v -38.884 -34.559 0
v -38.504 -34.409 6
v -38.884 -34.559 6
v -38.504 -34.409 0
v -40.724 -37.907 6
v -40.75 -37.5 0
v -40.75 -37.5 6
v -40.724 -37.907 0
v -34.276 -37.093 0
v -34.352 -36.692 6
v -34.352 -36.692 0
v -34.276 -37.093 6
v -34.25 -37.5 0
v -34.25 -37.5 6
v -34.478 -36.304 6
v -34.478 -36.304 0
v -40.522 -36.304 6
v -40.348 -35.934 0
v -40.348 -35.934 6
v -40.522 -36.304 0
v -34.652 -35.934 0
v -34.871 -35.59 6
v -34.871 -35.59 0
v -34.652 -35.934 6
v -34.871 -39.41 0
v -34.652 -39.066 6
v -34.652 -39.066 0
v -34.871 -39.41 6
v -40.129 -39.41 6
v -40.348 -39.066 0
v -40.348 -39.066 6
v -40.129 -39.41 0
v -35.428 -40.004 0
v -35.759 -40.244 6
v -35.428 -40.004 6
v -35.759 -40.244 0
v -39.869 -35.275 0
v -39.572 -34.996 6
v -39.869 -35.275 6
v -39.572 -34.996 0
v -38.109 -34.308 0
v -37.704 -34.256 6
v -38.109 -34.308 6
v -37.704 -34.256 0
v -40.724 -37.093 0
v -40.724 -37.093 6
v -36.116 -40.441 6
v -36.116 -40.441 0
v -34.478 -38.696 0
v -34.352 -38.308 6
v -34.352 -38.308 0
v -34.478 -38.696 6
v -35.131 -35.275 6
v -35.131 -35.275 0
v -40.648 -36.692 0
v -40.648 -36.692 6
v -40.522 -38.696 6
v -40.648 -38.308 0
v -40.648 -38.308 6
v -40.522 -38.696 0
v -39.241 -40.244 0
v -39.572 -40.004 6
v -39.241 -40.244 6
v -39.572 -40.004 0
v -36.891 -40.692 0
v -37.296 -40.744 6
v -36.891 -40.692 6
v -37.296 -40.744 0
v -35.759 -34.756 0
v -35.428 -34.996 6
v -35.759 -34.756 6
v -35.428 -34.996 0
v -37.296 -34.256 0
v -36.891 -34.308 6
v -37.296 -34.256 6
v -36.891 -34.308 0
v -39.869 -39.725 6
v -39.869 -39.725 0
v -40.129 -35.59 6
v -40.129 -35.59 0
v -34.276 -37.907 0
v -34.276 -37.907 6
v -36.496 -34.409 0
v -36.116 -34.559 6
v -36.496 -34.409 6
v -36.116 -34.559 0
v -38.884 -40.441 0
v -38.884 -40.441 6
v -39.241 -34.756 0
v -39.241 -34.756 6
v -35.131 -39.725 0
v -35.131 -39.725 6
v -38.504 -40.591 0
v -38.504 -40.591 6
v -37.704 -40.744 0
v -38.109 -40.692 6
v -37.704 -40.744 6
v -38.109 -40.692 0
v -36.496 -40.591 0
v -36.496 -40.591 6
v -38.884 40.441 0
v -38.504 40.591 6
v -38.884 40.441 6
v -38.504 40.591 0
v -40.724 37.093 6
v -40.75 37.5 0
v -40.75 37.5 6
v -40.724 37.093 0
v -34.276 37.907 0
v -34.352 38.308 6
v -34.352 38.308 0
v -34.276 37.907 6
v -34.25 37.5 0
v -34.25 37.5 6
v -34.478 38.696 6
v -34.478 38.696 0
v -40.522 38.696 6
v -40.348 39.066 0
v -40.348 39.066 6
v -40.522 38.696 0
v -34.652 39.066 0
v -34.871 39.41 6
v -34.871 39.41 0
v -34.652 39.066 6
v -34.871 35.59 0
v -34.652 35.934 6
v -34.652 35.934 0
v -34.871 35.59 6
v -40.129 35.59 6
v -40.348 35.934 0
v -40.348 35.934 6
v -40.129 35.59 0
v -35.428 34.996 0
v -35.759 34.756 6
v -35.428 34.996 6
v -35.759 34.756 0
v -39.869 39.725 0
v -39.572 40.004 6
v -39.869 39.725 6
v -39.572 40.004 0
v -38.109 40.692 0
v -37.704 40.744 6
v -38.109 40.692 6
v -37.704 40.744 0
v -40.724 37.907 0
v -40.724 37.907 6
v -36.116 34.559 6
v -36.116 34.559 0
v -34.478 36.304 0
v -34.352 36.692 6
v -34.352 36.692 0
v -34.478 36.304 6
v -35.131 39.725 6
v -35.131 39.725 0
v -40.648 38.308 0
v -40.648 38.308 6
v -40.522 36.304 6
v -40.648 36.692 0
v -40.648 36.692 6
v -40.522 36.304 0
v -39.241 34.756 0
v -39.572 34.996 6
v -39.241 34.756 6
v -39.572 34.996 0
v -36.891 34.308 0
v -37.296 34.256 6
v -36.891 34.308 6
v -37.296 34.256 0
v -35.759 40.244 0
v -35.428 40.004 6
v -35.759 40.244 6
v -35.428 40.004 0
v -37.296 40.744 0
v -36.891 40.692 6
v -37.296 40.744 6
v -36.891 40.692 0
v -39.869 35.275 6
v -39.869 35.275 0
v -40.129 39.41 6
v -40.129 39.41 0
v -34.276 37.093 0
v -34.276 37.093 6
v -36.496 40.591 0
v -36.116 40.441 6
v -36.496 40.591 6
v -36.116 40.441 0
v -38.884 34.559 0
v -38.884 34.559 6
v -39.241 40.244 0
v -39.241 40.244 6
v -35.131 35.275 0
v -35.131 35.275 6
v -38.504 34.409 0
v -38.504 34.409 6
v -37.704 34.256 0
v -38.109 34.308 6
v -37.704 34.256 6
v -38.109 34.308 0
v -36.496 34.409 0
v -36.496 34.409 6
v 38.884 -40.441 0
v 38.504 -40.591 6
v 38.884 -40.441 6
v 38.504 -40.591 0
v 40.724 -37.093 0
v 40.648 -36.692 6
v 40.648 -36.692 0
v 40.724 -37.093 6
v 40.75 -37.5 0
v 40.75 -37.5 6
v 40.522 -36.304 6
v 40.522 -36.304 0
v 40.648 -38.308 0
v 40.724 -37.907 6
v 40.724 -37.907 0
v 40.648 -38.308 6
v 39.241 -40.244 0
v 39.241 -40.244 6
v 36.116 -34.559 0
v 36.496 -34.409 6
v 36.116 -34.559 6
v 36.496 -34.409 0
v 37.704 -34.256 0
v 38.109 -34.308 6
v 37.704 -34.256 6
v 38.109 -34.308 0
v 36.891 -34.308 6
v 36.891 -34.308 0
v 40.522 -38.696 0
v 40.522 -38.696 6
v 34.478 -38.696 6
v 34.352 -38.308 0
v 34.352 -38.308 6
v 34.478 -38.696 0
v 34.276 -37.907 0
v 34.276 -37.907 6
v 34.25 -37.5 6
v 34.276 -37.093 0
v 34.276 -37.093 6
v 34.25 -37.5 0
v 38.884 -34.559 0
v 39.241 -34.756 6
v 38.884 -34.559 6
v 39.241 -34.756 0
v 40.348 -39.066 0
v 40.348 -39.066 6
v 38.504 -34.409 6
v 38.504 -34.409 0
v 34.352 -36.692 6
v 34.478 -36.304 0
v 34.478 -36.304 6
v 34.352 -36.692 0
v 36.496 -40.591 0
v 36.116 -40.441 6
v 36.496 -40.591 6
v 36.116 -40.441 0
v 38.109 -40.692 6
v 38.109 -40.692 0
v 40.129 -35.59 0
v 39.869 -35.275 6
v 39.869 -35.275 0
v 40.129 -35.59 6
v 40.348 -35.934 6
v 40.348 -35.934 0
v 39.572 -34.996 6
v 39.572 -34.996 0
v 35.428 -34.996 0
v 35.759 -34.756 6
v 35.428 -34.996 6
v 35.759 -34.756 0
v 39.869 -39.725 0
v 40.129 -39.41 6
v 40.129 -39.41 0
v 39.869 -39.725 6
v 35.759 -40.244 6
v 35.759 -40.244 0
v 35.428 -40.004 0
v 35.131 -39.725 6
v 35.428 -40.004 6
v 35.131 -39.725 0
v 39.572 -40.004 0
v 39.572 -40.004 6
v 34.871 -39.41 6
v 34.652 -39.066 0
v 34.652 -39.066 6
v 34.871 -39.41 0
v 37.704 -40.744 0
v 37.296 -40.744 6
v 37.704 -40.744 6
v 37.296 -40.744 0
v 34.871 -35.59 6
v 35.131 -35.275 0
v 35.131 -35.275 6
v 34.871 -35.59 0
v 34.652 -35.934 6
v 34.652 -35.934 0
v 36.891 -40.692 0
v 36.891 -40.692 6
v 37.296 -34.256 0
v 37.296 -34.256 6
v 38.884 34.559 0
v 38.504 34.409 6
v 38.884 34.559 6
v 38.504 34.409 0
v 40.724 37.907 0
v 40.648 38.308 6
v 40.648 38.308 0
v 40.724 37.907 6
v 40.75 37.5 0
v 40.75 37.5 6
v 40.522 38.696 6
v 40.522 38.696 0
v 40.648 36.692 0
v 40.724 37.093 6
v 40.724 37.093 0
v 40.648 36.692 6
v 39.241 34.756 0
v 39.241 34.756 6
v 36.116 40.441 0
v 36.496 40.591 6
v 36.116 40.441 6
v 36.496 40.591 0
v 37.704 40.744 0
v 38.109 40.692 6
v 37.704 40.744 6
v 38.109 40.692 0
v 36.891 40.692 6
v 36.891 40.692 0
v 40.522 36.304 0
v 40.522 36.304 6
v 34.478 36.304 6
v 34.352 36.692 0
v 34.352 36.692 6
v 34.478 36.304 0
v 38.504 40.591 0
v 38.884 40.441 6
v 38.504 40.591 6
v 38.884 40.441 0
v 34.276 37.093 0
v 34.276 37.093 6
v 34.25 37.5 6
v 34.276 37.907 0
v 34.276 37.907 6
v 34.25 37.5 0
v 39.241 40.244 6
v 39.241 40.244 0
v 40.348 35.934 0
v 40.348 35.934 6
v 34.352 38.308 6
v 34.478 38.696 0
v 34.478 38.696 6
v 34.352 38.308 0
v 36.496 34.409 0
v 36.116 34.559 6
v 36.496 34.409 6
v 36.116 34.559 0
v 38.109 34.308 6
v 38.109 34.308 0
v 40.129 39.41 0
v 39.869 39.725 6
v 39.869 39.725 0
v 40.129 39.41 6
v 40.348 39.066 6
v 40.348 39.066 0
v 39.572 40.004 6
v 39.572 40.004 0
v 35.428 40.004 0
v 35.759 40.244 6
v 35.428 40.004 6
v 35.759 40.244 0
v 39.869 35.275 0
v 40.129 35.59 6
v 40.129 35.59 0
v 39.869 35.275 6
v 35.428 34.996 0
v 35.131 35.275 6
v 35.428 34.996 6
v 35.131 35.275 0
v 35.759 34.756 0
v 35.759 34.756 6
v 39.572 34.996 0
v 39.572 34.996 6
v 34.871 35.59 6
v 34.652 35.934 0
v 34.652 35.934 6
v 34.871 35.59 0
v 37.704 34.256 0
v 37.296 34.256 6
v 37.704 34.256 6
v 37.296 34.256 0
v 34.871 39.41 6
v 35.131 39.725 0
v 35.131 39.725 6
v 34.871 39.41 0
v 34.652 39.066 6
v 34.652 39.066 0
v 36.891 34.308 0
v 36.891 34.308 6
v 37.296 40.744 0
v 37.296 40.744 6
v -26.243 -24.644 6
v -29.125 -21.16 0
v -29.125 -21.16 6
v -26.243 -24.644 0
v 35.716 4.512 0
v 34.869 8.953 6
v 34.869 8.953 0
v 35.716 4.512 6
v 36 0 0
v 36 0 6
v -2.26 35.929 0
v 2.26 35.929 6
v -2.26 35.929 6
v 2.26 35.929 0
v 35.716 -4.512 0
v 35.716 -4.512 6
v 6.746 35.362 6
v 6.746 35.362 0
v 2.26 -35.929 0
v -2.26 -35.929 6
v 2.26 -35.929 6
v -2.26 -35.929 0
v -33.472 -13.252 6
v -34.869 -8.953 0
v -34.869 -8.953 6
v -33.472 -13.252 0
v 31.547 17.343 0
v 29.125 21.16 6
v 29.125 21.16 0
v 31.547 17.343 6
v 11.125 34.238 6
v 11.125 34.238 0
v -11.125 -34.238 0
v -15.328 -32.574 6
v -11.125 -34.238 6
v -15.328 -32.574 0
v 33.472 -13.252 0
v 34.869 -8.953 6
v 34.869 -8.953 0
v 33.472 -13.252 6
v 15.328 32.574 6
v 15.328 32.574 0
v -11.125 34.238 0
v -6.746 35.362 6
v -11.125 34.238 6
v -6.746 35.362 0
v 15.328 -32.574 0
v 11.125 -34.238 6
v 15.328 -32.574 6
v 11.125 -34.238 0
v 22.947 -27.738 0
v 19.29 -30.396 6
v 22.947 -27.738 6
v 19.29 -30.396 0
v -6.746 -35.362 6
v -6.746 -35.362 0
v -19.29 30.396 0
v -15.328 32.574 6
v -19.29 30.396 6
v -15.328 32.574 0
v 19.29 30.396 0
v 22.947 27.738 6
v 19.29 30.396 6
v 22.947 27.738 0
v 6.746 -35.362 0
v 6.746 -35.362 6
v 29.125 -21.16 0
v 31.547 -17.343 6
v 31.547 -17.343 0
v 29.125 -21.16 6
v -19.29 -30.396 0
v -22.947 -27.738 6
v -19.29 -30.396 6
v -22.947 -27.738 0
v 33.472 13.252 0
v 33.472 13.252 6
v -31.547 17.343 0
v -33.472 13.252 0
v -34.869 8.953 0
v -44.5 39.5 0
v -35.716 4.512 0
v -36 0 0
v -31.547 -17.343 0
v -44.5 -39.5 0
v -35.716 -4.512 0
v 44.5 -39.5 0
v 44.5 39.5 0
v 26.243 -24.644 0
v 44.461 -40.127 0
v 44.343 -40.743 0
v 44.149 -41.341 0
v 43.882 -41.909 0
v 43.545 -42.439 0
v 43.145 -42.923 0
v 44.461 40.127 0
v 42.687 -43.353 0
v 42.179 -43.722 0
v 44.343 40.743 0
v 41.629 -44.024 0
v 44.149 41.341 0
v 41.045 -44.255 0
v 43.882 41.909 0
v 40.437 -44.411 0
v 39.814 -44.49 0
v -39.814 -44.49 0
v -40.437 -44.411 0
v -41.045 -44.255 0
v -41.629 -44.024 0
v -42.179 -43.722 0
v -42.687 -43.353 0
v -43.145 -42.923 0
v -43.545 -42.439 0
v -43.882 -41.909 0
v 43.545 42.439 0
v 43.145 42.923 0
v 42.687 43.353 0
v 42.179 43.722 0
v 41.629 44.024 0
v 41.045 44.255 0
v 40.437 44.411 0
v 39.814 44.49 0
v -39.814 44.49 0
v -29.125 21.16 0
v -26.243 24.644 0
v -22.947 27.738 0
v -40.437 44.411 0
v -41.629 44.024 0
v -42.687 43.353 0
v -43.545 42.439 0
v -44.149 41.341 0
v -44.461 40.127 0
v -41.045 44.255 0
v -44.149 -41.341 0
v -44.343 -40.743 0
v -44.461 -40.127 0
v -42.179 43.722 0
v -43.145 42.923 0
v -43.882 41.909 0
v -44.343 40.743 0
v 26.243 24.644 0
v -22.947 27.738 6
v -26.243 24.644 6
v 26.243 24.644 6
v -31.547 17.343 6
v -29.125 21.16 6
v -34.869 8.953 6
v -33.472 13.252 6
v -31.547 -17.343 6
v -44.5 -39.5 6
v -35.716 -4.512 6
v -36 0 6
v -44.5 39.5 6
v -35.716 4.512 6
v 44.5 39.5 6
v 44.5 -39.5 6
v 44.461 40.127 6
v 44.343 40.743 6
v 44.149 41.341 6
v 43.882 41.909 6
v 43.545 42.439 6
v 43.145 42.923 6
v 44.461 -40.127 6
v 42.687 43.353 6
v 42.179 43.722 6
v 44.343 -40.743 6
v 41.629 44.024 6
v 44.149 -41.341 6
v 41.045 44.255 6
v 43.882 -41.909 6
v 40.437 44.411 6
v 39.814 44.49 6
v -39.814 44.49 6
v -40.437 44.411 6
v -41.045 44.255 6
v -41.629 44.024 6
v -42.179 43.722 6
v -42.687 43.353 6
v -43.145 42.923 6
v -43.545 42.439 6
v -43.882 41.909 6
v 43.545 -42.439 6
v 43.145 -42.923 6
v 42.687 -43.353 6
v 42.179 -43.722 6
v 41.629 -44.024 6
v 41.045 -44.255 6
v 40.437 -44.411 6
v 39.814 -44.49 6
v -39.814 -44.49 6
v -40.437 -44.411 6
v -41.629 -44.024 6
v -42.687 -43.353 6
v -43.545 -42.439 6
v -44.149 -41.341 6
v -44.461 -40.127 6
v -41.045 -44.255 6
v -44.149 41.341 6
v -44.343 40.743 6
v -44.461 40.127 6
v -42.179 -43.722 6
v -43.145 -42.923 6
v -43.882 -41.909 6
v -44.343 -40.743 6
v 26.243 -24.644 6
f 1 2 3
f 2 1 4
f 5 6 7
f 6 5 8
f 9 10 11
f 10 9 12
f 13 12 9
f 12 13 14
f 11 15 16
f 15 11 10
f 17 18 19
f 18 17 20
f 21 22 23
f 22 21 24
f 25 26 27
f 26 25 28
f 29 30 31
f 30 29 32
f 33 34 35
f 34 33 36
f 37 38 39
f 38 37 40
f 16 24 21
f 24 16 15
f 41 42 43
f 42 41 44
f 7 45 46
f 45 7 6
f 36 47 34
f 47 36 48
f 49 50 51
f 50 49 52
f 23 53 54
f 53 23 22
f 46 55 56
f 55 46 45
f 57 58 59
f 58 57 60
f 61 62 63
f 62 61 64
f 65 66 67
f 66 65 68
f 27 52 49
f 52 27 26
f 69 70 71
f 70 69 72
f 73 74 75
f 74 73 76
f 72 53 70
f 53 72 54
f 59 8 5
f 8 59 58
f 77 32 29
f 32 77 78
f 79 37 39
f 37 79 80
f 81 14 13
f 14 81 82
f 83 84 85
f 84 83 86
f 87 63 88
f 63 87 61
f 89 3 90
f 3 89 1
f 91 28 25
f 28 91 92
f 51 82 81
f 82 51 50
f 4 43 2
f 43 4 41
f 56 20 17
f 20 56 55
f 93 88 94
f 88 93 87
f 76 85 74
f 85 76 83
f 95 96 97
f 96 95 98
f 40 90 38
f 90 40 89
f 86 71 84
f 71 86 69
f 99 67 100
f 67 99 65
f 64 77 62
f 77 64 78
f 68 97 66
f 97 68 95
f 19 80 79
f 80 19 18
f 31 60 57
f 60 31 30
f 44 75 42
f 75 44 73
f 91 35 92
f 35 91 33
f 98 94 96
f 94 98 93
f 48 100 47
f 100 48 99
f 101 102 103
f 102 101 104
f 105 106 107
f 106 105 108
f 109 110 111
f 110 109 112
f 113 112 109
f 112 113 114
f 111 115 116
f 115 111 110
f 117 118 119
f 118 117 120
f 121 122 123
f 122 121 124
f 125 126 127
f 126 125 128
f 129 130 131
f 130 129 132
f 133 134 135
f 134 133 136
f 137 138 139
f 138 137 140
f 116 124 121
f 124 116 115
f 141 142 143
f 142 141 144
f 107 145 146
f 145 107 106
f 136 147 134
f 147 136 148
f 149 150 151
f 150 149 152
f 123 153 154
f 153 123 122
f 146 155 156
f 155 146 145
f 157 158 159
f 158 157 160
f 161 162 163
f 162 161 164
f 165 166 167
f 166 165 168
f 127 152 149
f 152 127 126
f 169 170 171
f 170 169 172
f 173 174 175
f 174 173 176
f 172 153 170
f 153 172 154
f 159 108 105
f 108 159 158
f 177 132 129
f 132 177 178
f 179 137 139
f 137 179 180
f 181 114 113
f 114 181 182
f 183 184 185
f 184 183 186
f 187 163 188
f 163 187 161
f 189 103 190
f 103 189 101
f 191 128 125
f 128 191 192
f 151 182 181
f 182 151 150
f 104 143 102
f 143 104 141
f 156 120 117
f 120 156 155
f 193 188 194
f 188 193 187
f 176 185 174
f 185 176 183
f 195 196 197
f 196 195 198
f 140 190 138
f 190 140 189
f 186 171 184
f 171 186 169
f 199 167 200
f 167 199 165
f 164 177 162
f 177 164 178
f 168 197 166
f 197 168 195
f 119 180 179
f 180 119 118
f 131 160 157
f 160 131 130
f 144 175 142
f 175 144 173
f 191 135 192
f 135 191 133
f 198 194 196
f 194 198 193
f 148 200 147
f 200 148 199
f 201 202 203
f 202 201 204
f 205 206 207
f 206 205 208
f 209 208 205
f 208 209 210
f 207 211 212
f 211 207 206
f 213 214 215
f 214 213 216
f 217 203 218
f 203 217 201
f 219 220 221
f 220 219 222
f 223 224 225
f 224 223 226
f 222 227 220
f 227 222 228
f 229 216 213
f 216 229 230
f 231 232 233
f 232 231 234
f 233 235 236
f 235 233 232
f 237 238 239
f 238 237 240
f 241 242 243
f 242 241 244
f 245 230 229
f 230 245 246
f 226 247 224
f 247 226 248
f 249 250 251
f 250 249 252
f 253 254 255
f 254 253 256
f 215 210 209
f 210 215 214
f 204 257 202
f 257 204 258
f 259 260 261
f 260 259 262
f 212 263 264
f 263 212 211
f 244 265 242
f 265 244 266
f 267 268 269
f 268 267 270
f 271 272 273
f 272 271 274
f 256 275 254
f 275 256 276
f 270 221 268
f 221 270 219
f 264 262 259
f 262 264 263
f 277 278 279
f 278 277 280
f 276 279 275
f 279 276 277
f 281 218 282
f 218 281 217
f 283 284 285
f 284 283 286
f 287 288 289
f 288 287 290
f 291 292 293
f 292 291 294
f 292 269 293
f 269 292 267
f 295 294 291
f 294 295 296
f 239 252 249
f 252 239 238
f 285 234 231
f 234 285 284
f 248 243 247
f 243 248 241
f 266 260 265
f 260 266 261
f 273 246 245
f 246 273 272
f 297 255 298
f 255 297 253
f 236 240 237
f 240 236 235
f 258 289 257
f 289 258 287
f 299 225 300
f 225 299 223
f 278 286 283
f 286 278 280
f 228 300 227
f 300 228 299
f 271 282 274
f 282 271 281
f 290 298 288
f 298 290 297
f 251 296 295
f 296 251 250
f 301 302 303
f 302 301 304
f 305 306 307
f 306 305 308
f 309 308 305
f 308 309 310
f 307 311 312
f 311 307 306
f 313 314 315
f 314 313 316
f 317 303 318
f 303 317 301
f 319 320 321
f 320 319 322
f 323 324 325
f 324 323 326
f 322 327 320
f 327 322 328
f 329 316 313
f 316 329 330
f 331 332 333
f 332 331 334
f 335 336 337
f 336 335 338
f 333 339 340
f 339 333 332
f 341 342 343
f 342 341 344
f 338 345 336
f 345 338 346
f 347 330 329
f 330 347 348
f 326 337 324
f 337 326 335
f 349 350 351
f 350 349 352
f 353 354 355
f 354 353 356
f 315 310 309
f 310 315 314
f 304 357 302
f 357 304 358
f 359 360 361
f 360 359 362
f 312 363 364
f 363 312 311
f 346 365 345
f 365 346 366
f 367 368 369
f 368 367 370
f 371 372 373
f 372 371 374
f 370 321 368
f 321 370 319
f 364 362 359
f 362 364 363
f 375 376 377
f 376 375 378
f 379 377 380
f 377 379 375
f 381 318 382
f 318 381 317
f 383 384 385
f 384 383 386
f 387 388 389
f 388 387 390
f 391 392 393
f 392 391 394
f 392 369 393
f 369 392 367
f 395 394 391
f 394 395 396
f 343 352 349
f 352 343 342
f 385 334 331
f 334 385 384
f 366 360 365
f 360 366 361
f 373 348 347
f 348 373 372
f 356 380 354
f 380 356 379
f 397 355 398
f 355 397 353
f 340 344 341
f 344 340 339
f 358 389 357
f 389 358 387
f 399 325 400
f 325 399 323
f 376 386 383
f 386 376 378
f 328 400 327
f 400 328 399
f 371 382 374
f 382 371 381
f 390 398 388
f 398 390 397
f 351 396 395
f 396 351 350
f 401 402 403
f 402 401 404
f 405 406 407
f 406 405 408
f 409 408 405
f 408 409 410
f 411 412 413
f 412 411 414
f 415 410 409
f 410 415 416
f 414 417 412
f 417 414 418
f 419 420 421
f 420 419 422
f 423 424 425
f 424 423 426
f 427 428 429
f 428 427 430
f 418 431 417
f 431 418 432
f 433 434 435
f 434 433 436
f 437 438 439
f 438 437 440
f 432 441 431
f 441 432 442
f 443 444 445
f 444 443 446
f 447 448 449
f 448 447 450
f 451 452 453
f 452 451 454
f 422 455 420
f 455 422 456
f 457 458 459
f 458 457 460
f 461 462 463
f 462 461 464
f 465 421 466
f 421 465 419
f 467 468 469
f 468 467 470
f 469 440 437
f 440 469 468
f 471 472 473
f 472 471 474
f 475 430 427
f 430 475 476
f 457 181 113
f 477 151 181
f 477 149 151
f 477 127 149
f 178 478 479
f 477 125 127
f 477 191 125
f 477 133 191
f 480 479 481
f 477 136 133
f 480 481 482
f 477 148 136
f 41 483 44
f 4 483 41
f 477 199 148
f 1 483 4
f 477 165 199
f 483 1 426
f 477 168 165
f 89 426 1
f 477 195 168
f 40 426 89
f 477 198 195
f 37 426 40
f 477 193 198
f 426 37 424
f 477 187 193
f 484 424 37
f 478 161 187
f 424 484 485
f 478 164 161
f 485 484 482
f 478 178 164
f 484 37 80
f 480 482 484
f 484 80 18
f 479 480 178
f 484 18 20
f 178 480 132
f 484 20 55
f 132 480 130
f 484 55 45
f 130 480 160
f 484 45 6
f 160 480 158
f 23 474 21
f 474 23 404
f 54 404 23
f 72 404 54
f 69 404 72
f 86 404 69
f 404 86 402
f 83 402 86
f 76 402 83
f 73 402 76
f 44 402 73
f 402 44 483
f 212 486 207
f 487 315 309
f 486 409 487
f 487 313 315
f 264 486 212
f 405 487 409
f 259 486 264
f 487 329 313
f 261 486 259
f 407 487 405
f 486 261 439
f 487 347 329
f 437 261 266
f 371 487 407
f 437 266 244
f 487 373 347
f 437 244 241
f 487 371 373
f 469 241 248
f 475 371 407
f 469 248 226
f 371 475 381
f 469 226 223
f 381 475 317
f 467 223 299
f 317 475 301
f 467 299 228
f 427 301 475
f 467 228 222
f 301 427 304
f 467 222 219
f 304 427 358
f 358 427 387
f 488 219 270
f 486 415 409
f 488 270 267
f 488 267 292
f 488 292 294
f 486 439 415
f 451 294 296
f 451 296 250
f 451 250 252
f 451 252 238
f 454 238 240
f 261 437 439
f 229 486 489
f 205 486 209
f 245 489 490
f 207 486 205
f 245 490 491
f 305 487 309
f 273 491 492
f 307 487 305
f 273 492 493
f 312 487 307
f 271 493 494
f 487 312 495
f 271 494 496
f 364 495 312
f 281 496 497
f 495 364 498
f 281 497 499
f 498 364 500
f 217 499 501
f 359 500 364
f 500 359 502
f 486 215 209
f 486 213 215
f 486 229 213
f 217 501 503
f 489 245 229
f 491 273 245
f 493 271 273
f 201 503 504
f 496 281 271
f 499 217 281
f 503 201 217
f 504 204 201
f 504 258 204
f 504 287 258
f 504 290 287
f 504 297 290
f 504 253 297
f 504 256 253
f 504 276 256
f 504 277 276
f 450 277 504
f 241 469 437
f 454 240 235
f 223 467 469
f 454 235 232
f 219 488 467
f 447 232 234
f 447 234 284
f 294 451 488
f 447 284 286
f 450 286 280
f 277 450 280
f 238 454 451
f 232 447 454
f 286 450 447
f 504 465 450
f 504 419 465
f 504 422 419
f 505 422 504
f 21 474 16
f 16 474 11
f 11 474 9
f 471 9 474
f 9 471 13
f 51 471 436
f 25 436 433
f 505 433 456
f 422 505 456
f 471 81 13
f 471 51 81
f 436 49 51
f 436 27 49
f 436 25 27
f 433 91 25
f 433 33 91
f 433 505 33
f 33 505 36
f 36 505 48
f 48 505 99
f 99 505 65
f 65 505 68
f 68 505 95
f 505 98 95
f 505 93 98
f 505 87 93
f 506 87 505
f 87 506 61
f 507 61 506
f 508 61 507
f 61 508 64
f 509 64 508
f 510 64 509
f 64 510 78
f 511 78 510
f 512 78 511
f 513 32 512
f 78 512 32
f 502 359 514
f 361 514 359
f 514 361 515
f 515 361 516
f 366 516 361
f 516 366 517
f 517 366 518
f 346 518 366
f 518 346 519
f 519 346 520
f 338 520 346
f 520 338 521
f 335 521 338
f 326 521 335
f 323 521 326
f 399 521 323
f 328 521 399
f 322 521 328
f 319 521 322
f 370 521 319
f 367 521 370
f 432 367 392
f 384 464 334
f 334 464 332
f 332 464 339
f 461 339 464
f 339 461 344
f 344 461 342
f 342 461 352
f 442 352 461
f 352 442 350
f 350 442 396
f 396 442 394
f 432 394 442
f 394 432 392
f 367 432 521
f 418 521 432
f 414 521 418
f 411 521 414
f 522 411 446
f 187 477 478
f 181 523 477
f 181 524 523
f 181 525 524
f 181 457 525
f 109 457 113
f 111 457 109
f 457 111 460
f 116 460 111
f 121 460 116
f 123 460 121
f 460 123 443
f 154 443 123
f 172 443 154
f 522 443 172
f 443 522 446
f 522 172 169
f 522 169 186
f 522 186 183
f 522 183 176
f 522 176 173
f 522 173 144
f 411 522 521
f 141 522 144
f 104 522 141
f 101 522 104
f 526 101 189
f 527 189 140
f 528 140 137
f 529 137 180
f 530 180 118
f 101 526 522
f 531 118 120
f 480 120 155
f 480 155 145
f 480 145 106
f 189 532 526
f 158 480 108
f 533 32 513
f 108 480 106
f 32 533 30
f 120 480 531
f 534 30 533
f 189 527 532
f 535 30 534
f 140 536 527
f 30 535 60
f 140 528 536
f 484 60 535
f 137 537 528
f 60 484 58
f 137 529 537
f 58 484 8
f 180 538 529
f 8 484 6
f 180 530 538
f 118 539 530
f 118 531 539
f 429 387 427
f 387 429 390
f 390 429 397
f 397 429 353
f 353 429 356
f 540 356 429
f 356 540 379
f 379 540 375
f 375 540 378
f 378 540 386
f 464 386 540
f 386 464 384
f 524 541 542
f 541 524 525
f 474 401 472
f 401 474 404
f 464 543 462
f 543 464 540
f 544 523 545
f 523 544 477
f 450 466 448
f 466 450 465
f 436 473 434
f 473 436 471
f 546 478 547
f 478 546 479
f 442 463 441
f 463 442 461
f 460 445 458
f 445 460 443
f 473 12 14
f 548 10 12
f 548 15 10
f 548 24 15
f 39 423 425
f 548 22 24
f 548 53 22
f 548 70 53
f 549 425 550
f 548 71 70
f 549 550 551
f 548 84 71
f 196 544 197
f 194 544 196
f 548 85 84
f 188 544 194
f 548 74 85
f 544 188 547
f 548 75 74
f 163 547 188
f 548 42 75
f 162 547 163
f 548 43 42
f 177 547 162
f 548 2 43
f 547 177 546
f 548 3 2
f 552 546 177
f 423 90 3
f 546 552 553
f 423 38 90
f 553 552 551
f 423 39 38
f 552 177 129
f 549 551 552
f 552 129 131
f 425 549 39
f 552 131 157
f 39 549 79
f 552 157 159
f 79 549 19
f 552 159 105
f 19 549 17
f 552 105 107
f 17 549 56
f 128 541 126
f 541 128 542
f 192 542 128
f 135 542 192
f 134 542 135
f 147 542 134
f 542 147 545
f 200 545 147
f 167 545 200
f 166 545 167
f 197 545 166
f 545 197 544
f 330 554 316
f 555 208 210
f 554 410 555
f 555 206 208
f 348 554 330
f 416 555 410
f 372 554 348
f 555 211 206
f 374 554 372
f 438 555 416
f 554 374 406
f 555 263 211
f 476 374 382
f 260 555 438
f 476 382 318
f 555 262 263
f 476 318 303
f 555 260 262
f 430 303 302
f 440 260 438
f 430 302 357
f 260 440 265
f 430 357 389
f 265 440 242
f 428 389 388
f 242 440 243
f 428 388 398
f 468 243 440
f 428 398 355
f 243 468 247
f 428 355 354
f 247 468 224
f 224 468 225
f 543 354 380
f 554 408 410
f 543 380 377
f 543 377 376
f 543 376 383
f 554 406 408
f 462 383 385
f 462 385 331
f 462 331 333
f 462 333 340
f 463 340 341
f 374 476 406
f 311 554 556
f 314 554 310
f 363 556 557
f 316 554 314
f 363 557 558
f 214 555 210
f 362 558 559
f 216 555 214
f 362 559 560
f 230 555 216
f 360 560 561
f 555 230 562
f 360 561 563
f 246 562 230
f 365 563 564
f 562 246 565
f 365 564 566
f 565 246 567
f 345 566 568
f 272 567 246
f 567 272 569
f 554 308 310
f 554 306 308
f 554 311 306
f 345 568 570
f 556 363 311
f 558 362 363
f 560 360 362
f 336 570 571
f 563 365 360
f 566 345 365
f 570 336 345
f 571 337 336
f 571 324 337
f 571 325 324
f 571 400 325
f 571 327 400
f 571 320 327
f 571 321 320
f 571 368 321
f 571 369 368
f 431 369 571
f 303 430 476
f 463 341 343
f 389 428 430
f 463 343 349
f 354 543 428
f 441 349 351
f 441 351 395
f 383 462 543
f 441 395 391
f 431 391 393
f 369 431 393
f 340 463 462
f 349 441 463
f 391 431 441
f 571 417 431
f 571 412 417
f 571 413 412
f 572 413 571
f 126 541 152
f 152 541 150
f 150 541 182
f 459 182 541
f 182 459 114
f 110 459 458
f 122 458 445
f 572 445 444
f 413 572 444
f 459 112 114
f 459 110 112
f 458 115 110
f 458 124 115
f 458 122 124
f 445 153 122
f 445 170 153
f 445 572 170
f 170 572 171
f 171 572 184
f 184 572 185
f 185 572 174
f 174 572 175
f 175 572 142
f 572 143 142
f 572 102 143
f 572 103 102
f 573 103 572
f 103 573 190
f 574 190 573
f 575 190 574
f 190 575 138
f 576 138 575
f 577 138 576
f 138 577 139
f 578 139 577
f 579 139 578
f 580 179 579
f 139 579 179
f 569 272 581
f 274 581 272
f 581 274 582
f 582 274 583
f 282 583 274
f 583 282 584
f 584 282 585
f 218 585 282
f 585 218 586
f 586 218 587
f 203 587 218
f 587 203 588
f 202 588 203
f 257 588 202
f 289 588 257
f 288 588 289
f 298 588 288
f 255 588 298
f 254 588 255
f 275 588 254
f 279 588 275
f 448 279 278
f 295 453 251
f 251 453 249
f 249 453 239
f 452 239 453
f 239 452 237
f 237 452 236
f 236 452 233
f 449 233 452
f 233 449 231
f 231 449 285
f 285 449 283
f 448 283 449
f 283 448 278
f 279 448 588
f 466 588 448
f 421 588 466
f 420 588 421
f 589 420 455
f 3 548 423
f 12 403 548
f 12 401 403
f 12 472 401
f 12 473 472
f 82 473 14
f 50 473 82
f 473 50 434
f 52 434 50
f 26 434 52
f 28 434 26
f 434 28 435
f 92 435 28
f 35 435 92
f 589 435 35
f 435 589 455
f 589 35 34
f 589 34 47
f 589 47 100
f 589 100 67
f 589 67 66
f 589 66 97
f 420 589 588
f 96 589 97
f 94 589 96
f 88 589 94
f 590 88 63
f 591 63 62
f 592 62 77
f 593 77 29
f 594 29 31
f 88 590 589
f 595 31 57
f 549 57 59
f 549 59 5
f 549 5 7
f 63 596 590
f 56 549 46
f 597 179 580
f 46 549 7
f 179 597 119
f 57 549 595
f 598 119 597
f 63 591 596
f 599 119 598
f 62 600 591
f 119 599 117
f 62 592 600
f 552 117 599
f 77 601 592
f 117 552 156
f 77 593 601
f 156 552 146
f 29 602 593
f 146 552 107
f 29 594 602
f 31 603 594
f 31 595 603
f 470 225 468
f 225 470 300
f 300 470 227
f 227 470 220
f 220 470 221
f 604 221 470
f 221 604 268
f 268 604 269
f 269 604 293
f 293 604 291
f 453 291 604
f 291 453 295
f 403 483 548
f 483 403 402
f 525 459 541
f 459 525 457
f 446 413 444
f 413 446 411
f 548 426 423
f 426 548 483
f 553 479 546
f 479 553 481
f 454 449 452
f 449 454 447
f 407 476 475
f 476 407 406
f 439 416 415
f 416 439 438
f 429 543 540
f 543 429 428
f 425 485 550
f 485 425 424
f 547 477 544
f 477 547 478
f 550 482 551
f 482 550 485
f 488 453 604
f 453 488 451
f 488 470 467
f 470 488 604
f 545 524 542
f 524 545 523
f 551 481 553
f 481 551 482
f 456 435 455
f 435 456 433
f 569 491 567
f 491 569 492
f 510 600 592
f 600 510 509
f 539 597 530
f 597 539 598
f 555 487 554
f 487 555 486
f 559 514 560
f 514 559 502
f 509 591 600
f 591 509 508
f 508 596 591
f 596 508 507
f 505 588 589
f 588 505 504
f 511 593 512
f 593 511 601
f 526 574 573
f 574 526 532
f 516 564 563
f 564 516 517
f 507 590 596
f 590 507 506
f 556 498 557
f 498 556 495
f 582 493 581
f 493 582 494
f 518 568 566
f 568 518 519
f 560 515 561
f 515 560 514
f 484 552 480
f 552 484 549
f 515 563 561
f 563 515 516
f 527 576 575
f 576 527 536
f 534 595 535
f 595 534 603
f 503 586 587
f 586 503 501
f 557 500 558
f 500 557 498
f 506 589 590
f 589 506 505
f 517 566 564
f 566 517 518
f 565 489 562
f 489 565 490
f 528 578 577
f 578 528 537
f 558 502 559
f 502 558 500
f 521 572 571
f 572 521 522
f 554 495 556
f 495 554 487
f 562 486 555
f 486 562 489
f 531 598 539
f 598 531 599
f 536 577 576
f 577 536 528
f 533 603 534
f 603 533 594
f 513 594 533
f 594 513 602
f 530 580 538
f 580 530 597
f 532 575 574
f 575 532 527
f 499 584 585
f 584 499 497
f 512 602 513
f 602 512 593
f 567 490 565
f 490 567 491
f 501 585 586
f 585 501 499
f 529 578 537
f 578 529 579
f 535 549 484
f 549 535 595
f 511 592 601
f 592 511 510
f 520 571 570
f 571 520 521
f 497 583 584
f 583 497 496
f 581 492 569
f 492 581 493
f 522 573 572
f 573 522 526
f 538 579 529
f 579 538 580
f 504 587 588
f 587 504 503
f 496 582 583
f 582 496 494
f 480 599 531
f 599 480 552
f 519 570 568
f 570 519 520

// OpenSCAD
$fn = 50;


difference() {
	union() {
		hull() {
			translate(v = [-39.5000000000, 39.5000000000, 0]) {
				cylinder(h = 6, r = 5);
			}
			translate(v = [39.5000000000, 39.5000000000, 0]) {
				cylinder(h = 6, r = 5);
			}
			translate(v = [-39.5000000000, -39.5000000000, 0]) {
				cylinder(h = 6, r = 5);
			}
			translate(v = [39.5000000000, -39.5000000000, 0]) {
				cylinder(h = 6, r = 5);
			}
		}
	}
	union() {
		#translate(v = [-37.5000000000, -37.5000000000, -100.0000000000]) {
			cylinder(h = 200, r = 3.2500000000);
		}
		#translate(v = [-37.5000000000, 37.5000000000, -100.0000000000]) {
			cylinder(h = 200, r = 3.2500000000);
		}
		#translate(v = [37.5000000000, -37.5000000000, -100.0000000000]) {
			cylinder(h = 200, r = 3.2500000000);
		}
		#translate(v = [37.5000000000, 37.5000000000, -100.0000000000]) {
			cylinder(h = 200, r = 3.2500000000);
		}
		#cylinder(h = 6, r = 36.0000000000);
	}
}
